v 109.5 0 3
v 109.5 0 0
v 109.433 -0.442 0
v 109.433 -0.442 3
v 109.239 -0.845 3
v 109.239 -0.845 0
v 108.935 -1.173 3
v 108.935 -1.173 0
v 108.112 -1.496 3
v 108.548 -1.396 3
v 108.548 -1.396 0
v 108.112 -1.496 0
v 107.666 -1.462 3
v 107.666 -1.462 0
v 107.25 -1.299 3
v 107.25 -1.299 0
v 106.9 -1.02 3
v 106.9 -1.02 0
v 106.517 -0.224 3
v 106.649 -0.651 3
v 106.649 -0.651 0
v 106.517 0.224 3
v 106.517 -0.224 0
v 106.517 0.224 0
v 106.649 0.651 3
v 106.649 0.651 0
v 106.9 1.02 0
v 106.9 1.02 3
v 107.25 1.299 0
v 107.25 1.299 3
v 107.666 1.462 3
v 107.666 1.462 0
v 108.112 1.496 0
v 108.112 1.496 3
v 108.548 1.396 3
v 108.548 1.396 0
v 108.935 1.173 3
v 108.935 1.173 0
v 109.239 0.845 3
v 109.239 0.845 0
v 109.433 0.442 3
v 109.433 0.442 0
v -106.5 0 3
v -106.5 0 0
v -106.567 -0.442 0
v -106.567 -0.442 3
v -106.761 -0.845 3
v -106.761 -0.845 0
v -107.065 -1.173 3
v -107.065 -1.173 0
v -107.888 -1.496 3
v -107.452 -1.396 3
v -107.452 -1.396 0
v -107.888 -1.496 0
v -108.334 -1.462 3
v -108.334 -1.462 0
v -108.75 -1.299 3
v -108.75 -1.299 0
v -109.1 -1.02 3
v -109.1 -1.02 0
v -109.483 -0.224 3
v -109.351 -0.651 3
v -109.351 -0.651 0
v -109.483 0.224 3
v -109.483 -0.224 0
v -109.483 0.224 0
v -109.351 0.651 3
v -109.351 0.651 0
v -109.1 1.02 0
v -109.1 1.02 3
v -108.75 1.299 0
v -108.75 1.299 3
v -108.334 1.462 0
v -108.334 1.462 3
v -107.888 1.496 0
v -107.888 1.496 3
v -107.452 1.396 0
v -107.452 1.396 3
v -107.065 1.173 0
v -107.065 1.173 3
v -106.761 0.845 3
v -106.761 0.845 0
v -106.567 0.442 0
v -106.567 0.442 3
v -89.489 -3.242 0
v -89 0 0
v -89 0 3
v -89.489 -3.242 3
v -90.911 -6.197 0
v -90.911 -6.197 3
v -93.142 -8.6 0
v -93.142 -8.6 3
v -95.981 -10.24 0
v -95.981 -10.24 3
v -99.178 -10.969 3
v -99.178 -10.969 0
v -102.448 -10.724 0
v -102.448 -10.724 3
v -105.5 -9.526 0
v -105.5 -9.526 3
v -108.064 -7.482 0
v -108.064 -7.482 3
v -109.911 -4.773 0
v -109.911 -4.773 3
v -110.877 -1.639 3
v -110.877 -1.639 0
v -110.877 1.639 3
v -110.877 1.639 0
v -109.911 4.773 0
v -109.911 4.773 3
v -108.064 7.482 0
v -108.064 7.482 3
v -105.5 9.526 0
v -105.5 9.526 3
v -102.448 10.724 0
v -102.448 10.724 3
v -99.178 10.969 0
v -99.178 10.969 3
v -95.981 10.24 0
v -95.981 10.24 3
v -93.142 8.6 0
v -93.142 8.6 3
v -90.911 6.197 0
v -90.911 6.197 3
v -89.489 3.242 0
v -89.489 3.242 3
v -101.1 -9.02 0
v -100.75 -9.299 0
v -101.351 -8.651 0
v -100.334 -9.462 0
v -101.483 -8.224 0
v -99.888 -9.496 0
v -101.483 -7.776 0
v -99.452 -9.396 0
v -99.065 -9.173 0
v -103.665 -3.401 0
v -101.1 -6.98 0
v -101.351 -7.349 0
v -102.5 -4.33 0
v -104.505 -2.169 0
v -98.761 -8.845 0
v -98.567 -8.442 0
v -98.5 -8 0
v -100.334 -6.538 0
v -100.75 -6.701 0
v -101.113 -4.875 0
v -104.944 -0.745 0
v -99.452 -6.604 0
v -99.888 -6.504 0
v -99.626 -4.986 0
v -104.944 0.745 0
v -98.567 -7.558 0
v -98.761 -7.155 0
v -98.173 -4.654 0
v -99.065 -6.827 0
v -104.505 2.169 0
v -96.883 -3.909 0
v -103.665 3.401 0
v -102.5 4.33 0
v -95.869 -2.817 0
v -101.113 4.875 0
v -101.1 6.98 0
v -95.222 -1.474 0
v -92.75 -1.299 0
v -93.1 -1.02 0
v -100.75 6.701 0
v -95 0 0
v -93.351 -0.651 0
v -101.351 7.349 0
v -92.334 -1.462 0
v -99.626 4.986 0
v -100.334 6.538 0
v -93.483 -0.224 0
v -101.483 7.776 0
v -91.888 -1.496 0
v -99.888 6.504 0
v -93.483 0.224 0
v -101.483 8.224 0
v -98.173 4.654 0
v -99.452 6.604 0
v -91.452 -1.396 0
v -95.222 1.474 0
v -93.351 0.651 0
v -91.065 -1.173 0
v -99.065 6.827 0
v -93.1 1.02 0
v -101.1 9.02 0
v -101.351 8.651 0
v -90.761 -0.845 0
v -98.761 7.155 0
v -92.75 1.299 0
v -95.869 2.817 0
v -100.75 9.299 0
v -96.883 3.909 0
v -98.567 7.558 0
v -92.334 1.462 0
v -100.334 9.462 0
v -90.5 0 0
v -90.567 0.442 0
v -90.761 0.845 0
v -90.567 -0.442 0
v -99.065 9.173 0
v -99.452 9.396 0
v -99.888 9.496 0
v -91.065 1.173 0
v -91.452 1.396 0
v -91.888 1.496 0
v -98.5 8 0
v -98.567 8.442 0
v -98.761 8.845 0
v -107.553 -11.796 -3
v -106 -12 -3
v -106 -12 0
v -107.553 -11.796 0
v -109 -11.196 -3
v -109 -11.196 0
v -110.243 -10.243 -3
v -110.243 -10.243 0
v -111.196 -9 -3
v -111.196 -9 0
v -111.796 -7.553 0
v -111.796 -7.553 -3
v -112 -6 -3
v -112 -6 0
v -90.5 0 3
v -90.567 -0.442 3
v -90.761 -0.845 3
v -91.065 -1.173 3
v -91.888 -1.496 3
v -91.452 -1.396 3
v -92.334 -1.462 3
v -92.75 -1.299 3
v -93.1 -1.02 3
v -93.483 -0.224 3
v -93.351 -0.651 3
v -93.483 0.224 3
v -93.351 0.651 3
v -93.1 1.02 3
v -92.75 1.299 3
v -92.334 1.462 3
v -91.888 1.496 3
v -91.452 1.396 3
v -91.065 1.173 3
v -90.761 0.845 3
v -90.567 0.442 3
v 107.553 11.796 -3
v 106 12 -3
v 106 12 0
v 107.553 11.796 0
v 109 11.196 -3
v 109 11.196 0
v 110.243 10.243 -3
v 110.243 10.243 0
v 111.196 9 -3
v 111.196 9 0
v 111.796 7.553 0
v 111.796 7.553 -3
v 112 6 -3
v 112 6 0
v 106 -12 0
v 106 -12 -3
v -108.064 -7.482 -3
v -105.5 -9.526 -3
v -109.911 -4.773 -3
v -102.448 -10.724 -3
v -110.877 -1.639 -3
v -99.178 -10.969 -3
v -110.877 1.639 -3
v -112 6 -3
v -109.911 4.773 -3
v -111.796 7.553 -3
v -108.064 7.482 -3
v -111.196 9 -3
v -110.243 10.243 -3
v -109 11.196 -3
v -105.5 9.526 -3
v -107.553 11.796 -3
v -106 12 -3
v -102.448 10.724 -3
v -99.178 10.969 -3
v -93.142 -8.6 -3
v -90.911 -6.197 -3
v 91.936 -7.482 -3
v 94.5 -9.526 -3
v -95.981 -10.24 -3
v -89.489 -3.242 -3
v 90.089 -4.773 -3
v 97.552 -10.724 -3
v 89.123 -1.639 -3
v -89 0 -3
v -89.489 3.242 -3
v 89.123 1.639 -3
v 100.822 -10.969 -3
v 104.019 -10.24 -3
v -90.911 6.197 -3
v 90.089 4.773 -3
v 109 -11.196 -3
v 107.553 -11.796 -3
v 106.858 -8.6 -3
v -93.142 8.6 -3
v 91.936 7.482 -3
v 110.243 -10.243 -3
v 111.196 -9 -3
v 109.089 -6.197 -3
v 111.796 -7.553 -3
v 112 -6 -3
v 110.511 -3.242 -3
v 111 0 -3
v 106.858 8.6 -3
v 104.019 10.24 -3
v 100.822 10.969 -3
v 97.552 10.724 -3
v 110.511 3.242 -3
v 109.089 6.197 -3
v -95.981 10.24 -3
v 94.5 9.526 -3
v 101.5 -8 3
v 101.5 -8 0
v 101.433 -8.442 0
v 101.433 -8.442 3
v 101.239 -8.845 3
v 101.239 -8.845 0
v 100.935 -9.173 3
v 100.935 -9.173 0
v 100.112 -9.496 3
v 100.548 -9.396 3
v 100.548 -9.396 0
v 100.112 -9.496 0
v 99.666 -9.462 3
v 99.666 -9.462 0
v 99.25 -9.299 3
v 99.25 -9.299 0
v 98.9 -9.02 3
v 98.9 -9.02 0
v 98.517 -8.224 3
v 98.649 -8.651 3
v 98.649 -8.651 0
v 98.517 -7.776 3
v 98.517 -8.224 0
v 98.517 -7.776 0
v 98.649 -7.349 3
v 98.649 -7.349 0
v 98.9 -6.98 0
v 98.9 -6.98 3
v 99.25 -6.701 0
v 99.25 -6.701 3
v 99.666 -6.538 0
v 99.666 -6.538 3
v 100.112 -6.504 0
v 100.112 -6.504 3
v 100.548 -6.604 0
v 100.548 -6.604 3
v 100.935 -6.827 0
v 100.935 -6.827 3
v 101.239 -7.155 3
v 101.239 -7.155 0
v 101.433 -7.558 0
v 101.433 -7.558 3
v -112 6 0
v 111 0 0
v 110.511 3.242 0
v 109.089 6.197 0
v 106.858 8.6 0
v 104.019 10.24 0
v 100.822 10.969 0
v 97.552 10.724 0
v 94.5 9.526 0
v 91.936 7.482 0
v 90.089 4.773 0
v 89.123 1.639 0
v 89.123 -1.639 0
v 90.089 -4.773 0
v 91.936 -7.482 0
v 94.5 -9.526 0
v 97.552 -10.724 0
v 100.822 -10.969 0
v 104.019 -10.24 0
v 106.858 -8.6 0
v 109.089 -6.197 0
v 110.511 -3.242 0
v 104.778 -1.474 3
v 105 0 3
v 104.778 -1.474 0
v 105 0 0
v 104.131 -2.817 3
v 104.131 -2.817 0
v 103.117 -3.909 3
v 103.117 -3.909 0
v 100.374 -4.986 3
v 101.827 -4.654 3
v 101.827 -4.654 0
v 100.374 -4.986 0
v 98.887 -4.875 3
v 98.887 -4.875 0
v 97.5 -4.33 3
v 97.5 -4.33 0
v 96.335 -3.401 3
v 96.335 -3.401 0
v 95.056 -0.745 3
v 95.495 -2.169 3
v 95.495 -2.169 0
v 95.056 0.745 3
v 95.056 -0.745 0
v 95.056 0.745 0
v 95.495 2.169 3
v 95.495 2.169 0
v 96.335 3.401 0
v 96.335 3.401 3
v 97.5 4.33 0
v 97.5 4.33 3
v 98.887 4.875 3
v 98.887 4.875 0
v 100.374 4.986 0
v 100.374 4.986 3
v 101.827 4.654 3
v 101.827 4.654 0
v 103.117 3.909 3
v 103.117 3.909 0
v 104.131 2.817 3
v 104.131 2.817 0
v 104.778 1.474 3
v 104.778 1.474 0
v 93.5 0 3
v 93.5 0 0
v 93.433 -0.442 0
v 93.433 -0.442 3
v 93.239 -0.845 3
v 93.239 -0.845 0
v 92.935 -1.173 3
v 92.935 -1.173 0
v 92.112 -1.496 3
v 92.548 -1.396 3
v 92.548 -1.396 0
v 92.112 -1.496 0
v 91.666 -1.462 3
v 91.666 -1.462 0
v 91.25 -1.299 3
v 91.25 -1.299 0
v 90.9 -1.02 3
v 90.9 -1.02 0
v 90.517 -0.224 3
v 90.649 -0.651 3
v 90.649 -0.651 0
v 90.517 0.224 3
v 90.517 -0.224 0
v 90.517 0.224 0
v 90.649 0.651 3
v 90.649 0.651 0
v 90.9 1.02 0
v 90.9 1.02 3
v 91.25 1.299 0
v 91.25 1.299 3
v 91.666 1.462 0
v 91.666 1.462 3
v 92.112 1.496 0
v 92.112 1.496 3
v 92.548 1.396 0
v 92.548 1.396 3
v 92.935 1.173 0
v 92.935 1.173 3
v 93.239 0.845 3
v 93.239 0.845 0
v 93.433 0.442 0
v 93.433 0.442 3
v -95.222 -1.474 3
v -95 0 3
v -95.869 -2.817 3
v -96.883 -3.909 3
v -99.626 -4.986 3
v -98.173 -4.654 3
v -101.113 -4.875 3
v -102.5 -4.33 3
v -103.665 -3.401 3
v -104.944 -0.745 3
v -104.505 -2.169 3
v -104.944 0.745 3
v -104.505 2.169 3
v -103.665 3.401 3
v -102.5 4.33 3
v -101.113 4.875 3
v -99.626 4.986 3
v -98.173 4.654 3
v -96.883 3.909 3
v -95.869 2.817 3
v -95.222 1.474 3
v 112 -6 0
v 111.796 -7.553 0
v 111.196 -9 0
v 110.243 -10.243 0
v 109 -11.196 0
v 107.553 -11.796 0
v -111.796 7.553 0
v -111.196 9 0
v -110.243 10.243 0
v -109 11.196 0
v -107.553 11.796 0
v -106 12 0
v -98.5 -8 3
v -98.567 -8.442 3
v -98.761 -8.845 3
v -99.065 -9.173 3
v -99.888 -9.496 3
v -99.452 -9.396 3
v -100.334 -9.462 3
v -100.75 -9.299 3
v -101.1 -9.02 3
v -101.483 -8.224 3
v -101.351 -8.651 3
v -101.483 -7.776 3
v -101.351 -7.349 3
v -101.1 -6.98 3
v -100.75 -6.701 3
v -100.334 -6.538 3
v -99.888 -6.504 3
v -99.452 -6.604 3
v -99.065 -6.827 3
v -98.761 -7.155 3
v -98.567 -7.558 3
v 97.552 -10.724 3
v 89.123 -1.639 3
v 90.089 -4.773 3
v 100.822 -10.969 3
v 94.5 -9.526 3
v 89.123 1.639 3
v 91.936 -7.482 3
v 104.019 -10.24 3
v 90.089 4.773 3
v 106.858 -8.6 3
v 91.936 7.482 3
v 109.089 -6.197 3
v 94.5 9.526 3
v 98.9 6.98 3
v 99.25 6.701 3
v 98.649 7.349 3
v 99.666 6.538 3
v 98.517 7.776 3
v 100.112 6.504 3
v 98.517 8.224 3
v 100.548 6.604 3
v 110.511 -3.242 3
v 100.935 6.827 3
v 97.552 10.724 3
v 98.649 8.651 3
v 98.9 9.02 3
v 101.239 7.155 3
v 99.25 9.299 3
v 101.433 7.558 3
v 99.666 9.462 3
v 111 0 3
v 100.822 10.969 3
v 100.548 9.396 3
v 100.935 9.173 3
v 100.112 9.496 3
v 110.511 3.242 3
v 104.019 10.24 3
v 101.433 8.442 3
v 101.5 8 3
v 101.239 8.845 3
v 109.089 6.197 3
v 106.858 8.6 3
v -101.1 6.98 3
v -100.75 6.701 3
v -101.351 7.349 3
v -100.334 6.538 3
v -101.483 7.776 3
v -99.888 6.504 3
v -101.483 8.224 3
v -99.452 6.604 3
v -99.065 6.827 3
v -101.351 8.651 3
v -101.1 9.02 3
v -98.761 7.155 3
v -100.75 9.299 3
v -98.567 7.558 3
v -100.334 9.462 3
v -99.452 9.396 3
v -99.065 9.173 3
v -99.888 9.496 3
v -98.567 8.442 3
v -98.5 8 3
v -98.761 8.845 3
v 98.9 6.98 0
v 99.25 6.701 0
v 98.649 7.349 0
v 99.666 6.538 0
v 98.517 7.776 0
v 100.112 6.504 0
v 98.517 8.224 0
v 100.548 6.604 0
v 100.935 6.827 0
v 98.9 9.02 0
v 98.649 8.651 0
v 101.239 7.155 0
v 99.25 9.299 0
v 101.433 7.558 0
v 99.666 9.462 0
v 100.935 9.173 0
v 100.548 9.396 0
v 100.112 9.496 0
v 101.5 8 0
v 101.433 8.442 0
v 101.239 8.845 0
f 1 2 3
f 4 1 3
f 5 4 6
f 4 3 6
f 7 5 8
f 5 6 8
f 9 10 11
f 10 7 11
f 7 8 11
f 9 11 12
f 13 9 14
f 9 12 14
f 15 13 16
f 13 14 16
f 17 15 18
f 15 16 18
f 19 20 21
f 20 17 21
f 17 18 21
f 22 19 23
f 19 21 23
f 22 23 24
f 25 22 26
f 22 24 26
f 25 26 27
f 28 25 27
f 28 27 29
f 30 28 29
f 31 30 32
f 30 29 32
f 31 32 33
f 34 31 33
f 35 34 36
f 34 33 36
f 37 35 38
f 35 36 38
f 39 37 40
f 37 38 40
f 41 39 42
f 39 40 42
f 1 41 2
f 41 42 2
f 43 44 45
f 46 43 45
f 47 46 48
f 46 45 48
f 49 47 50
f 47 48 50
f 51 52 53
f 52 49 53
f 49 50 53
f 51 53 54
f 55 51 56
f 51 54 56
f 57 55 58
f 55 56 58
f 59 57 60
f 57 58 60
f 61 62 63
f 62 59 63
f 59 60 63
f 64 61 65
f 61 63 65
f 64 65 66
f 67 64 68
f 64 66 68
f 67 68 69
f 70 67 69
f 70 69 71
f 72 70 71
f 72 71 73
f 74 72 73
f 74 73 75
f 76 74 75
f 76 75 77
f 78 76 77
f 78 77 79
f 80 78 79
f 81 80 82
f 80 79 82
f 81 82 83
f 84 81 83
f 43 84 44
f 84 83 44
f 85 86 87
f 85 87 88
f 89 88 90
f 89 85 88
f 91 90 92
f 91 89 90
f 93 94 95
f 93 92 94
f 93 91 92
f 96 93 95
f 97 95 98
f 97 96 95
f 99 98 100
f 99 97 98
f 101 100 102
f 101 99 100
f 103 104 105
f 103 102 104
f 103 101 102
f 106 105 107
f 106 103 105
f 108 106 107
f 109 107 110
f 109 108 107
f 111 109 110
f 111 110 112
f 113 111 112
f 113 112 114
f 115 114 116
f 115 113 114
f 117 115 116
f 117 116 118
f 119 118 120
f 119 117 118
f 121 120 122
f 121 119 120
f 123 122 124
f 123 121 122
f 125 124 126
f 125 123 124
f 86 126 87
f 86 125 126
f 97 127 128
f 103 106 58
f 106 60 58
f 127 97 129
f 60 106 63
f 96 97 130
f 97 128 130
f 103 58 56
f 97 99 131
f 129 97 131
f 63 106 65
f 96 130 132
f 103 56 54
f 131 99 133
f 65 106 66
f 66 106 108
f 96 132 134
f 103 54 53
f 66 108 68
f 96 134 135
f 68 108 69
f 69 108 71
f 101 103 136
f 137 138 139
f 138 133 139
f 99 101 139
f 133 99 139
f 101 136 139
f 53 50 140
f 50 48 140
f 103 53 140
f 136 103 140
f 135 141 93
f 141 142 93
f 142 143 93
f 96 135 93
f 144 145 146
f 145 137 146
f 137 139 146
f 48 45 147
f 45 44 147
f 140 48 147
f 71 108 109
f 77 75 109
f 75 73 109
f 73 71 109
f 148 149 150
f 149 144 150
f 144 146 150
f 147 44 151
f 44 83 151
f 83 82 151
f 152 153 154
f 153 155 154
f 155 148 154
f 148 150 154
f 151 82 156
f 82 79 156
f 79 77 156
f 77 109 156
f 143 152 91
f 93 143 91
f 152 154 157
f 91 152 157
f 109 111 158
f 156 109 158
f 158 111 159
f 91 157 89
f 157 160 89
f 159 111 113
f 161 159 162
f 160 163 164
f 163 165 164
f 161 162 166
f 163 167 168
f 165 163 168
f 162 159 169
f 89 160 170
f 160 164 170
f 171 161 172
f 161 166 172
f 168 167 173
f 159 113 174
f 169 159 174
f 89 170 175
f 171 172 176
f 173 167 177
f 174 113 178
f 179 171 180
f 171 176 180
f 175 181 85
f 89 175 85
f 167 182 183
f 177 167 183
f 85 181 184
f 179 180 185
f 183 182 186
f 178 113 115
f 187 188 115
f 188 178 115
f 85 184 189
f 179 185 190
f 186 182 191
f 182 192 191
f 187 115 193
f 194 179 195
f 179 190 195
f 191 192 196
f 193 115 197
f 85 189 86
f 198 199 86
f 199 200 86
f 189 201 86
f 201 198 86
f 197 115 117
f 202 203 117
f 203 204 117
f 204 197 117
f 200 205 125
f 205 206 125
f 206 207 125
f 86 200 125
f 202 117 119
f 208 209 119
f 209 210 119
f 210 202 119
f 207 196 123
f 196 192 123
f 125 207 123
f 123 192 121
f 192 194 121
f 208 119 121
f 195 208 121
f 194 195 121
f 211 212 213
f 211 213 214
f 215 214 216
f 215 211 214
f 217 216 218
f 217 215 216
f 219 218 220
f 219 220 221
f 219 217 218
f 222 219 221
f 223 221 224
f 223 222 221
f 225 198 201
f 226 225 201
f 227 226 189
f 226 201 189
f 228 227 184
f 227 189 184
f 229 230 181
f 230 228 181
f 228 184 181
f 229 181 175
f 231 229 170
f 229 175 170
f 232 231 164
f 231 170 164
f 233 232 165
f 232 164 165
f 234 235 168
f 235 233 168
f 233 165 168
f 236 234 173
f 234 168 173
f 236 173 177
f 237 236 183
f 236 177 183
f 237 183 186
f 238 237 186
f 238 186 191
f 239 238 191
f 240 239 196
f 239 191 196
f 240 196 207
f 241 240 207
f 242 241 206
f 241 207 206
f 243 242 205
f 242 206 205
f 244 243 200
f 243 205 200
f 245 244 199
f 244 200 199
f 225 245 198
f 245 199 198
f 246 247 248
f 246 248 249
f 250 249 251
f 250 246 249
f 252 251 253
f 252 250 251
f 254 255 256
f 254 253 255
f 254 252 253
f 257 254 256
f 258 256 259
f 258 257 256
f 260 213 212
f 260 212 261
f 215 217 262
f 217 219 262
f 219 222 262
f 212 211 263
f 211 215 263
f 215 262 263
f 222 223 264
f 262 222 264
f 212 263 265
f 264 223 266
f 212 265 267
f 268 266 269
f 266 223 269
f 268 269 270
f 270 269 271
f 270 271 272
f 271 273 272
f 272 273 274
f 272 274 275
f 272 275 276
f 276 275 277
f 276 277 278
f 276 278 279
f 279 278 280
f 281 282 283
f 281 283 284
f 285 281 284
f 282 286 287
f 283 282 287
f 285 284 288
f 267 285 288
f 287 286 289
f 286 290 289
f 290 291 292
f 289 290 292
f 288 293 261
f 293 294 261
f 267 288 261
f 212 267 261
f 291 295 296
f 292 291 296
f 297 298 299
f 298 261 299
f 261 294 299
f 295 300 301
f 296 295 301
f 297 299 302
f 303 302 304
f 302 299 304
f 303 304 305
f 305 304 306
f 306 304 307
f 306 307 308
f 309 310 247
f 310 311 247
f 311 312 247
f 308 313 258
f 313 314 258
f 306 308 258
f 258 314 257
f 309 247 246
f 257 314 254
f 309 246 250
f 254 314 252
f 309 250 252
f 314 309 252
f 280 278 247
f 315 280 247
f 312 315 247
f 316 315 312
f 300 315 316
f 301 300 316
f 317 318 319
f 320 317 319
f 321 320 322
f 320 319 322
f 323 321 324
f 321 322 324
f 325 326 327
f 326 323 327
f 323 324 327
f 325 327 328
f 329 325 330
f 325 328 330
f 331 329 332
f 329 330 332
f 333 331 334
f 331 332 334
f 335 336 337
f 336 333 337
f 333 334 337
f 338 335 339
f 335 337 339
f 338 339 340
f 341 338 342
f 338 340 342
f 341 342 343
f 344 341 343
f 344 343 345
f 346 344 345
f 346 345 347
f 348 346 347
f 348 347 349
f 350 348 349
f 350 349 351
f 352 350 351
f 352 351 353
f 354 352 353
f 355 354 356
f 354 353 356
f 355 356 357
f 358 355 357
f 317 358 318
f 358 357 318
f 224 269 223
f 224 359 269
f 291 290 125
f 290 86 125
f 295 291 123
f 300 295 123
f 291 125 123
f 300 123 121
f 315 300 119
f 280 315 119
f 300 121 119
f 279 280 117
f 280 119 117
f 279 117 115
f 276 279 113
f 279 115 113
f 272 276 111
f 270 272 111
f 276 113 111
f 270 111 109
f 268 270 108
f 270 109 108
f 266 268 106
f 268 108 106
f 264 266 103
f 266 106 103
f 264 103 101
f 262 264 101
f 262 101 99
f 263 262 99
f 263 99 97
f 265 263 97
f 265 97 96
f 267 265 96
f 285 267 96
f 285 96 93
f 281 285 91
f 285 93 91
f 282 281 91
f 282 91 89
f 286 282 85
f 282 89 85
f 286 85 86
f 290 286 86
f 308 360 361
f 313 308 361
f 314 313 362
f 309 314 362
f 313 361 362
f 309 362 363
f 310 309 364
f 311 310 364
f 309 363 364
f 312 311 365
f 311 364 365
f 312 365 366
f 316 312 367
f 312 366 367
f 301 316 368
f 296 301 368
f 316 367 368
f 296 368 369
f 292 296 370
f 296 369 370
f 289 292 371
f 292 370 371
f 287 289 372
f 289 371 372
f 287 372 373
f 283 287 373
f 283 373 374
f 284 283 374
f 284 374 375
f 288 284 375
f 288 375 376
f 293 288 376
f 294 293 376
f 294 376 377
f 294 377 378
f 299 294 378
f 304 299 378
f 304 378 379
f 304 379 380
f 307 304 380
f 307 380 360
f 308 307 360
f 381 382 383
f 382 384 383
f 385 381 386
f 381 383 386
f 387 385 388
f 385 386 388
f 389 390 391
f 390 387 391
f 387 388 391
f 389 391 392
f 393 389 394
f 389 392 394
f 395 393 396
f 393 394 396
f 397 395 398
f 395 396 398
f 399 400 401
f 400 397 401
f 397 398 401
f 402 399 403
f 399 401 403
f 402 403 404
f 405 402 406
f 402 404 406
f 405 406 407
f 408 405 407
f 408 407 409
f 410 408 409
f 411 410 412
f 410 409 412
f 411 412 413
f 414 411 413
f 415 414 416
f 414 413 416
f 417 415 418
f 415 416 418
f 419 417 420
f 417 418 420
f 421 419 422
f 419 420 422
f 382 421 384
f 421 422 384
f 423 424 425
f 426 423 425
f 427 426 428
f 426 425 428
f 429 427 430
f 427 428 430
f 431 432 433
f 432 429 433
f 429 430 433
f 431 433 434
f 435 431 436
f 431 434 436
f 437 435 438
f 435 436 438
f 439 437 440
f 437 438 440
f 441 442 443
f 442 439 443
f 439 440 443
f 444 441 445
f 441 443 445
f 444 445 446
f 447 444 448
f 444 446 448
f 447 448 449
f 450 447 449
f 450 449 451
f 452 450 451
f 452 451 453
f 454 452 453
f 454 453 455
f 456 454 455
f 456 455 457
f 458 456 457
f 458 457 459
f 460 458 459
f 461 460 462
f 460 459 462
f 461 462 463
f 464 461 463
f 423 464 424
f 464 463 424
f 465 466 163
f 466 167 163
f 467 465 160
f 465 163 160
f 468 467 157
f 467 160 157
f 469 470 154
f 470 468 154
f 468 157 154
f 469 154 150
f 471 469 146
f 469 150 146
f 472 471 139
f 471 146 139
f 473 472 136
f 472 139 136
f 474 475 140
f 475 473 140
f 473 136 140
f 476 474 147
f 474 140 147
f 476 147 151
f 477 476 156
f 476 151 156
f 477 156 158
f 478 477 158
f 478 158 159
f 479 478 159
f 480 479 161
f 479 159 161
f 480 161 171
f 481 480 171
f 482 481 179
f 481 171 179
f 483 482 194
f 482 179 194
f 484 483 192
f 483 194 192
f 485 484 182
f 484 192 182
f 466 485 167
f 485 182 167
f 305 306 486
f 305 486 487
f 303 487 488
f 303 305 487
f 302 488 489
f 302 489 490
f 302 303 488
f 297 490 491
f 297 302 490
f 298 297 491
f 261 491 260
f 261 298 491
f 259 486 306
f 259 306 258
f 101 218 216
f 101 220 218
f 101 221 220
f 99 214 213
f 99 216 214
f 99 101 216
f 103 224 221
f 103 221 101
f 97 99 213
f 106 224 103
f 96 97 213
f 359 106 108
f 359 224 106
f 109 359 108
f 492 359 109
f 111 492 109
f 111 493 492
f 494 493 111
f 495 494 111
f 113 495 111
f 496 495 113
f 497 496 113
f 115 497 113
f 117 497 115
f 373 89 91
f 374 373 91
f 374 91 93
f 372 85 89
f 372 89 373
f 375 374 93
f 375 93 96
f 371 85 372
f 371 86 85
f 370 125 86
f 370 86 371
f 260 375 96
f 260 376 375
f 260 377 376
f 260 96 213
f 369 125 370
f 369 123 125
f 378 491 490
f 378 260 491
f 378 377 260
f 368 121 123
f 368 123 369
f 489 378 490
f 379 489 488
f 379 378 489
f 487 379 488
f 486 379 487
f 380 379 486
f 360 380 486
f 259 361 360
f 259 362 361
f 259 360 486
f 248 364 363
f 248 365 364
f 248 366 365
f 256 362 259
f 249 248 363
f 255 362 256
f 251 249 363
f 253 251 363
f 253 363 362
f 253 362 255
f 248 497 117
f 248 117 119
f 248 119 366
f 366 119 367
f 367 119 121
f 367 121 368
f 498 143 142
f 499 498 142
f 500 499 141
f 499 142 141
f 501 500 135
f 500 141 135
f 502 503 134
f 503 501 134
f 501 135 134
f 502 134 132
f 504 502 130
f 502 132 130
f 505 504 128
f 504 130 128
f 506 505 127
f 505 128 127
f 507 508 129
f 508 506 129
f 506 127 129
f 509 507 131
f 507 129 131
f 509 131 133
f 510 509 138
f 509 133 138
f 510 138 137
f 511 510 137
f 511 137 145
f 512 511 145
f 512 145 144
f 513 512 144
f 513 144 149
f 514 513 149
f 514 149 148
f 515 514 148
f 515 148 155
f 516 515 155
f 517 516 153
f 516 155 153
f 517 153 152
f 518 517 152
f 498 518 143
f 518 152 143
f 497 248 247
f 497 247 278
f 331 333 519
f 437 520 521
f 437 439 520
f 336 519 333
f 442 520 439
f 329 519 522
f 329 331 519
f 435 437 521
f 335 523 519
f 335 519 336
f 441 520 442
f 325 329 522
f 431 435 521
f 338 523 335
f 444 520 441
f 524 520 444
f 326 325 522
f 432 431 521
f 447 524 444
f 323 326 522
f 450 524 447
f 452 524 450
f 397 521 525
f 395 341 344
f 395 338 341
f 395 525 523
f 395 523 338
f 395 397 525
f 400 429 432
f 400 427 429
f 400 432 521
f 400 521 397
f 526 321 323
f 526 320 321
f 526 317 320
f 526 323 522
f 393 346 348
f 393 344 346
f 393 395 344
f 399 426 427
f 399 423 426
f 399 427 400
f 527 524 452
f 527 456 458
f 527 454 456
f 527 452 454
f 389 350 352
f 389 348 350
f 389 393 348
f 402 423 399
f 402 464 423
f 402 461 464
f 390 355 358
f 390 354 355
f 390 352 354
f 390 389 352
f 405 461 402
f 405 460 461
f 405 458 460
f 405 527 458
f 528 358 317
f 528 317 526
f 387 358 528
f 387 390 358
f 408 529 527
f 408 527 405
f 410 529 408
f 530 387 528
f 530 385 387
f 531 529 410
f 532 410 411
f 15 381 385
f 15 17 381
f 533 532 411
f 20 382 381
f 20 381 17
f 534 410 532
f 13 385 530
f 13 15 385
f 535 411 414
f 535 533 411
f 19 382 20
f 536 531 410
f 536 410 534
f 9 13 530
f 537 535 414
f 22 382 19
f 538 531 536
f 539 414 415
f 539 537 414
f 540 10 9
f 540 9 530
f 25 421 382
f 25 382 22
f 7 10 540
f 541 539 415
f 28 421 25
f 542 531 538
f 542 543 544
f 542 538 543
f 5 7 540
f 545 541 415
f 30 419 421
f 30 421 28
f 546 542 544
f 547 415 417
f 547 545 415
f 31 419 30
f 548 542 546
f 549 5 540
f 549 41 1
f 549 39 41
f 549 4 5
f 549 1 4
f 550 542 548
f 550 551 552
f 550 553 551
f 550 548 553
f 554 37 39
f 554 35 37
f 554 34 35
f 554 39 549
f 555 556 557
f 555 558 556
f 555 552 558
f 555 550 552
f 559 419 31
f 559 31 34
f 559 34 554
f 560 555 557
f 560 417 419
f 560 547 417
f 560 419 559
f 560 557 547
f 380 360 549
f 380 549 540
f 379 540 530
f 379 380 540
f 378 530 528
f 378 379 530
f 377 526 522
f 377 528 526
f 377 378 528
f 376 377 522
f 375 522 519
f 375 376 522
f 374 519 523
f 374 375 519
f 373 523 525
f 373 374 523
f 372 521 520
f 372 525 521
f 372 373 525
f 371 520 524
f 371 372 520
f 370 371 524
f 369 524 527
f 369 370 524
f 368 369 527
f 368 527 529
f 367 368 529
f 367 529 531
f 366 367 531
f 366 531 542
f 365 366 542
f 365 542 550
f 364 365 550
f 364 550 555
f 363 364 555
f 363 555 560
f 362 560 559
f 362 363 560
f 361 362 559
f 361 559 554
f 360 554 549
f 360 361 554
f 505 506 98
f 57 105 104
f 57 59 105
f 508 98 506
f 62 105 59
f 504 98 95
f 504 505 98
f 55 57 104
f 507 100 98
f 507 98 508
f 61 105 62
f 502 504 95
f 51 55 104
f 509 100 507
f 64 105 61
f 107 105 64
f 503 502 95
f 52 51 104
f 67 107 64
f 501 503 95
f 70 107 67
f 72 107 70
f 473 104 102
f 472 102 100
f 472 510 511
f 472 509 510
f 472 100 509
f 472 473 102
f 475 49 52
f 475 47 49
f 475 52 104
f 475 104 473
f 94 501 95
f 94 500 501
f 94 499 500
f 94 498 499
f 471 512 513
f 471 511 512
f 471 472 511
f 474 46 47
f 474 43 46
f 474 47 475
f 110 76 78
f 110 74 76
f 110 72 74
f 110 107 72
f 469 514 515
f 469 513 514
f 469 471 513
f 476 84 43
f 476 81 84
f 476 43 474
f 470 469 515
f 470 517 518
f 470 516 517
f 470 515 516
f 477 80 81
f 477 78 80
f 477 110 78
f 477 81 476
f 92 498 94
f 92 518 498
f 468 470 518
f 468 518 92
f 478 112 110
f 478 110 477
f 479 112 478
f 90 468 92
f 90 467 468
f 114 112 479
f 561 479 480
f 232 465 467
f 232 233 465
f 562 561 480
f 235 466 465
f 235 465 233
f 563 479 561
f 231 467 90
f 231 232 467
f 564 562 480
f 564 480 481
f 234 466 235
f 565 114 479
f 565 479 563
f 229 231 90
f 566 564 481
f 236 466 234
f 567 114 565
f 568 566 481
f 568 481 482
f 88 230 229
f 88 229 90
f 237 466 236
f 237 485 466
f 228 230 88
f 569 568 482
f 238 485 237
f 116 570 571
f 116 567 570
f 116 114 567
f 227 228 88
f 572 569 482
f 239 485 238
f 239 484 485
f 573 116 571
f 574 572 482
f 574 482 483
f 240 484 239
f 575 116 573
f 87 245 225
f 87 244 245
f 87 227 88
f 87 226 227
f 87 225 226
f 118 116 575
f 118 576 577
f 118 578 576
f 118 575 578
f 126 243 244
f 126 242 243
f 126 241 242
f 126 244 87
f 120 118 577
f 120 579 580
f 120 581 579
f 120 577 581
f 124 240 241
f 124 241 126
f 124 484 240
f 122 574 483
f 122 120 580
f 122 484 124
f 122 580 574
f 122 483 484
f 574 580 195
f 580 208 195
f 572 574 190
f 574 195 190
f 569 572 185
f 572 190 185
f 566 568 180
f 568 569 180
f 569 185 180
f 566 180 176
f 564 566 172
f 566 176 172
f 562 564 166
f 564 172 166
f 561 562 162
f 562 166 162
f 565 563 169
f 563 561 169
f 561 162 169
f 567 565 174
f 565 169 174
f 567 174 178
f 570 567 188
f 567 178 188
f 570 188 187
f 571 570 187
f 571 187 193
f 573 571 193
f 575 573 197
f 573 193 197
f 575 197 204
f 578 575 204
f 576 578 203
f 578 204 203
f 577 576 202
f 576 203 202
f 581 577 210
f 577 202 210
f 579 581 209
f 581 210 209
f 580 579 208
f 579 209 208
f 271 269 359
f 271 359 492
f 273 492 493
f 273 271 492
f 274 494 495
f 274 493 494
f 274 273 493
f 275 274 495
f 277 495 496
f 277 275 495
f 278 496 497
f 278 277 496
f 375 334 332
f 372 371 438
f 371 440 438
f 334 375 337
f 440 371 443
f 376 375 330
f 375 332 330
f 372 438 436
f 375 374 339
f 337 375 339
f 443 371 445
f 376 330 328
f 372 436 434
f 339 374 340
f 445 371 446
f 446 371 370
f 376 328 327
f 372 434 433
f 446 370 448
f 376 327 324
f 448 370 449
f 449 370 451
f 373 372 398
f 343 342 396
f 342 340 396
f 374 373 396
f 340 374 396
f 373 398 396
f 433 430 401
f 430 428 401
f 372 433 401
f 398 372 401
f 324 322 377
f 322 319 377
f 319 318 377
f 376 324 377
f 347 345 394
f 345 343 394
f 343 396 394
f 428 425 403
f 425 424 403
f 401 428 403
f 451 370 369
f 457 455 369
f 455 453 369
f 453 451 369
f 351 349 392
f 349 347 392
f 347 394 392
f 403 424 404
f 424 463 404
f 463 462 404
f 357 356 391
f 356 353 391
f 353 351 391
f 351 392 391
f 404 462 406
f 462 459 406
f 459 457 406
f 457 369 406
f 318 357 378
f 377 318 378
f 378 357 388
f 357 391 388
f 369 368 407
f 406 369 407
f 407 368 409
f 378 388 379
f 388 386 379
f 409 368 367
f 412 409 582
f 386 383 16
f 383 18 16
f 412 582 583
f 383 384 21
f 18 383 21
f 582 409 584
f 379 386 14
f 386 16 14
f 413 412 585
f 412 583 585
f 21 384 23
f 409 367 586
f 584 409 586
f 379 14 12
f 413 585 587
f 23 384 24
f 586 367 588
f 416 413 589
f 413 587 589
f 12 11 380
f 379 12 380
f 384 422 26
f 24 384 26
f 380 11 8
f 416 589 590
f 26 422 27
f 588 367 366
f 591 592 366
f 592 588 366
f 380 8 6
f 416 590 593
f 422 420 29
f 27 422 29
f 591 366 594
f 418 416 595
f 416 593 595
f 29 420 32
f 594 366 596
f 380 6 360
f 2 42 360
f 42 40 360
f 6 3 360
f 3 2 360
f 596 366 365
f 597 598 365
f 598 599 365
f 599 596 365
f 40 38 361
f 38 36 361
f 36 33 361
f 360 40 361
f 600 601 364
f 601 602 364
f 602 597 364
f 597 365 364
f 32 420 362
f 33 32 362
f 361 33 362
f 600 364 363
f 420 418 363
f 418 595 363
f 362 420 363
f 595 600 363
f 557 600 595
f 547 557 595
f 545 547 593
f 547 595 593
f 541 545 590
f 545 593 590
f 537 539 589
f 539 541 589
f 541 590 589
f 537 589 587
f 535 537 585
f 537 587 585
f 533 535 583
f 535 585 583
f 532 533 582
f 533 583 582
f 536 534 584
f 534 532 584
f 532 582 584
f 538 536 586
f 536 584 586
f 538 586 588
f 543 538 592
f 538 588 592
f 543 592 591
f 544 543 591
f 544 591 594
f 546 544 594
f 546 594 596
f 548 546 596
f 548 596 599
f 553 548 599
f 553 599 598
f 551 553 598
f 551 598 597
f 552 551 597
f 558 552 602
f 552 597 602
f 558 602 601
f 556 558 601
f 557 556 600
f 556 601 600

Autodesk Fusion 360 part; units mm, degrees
sketch "Sketch1" plane through (0, 0, 0) normal (0, 0, 1) x (1, 0, 0)
  line L0 (112, 12) -> (-112, 12)
  line L1 (-112, 12) -> (-112, -12)
  line L2 (-112, -12) -> (112, -12)
  line L3 (112, -12) -> (112, 12)
  line L4 (112, 12) -> (-112, -12) construction
  line L5 (-112, 12) -> (112, -12) construction
  circle A0 centre (-100, 0) radius 11
  circle A1 centre (-100, 0) radius 8 construction
  circle A2 centre (-100, 0) radius 5
  line L6 (0, 12) -> (0, -12) construction
  circle A3 centre (100, 0) radius 11
  circle A4 centre (100, 0) radius 8 construction
  circle A5 centre (100, 0) radius 5
  line L7 (-100, 16) -> (-100, -17.1313) construction
  line L8 (100, 15) -> (100, -17.9102) construction
  circle A6 centre (-100, 8) radius 1.5
  circle A7 centre (-92, 0) radius 1.5
  circle A8 centre (-100, -8) radius 1.5
  circle A9 centre (-108, 0) radius 1.5
  circle A10 centre (100, 8) radius 1.5
  circle A11 centre (108, 0) radius 1.5
  circle A12 centre (92, 0) radius 1.5
  circle A13 centre (100, -8) radius 1.5
  dimension "d1" = 224
  dimension "d2" = 24
  dimension "d3" = 22
  dimension "d4" = 16
  dimension "d5" = 10
  dimension "d6" = 12
  dimension "d7" = 12
  dimension "d8" = 3
  dimension "d9" = 3
  dimension "d10" = 3
  dimension "d11" = 3
  dimension "d12" = 3
  dimension "d13" = 3
  dimension "d14" = 3
  dimension "d15" = 3
sketch "Sketch2" plane through (0, 0, 0) normal (0, 0, 1) x (1, 0, 0)
extrude "Extrude1" add sketch "Sketch1" along normal blind 3 contours A0 | A3 makes body 1 at (-106.962, -3.4918, 0) makes body 2 at (106.962, -3.4918, 0)
extrude "Extrude2" add sketch "Sketch1" against normal blind 3 separate body contours L0 L1 L2 L3 makes body 3
fillet "Fillet1" radius 6 2 edges at (-112, -12, -1.5) (112, -12, -1.5) on bodies 3
fillet "Fillet2" radius 6 2 edges at (112, 12, -1.5) (-112, 12, -1.5) on bodies 3
